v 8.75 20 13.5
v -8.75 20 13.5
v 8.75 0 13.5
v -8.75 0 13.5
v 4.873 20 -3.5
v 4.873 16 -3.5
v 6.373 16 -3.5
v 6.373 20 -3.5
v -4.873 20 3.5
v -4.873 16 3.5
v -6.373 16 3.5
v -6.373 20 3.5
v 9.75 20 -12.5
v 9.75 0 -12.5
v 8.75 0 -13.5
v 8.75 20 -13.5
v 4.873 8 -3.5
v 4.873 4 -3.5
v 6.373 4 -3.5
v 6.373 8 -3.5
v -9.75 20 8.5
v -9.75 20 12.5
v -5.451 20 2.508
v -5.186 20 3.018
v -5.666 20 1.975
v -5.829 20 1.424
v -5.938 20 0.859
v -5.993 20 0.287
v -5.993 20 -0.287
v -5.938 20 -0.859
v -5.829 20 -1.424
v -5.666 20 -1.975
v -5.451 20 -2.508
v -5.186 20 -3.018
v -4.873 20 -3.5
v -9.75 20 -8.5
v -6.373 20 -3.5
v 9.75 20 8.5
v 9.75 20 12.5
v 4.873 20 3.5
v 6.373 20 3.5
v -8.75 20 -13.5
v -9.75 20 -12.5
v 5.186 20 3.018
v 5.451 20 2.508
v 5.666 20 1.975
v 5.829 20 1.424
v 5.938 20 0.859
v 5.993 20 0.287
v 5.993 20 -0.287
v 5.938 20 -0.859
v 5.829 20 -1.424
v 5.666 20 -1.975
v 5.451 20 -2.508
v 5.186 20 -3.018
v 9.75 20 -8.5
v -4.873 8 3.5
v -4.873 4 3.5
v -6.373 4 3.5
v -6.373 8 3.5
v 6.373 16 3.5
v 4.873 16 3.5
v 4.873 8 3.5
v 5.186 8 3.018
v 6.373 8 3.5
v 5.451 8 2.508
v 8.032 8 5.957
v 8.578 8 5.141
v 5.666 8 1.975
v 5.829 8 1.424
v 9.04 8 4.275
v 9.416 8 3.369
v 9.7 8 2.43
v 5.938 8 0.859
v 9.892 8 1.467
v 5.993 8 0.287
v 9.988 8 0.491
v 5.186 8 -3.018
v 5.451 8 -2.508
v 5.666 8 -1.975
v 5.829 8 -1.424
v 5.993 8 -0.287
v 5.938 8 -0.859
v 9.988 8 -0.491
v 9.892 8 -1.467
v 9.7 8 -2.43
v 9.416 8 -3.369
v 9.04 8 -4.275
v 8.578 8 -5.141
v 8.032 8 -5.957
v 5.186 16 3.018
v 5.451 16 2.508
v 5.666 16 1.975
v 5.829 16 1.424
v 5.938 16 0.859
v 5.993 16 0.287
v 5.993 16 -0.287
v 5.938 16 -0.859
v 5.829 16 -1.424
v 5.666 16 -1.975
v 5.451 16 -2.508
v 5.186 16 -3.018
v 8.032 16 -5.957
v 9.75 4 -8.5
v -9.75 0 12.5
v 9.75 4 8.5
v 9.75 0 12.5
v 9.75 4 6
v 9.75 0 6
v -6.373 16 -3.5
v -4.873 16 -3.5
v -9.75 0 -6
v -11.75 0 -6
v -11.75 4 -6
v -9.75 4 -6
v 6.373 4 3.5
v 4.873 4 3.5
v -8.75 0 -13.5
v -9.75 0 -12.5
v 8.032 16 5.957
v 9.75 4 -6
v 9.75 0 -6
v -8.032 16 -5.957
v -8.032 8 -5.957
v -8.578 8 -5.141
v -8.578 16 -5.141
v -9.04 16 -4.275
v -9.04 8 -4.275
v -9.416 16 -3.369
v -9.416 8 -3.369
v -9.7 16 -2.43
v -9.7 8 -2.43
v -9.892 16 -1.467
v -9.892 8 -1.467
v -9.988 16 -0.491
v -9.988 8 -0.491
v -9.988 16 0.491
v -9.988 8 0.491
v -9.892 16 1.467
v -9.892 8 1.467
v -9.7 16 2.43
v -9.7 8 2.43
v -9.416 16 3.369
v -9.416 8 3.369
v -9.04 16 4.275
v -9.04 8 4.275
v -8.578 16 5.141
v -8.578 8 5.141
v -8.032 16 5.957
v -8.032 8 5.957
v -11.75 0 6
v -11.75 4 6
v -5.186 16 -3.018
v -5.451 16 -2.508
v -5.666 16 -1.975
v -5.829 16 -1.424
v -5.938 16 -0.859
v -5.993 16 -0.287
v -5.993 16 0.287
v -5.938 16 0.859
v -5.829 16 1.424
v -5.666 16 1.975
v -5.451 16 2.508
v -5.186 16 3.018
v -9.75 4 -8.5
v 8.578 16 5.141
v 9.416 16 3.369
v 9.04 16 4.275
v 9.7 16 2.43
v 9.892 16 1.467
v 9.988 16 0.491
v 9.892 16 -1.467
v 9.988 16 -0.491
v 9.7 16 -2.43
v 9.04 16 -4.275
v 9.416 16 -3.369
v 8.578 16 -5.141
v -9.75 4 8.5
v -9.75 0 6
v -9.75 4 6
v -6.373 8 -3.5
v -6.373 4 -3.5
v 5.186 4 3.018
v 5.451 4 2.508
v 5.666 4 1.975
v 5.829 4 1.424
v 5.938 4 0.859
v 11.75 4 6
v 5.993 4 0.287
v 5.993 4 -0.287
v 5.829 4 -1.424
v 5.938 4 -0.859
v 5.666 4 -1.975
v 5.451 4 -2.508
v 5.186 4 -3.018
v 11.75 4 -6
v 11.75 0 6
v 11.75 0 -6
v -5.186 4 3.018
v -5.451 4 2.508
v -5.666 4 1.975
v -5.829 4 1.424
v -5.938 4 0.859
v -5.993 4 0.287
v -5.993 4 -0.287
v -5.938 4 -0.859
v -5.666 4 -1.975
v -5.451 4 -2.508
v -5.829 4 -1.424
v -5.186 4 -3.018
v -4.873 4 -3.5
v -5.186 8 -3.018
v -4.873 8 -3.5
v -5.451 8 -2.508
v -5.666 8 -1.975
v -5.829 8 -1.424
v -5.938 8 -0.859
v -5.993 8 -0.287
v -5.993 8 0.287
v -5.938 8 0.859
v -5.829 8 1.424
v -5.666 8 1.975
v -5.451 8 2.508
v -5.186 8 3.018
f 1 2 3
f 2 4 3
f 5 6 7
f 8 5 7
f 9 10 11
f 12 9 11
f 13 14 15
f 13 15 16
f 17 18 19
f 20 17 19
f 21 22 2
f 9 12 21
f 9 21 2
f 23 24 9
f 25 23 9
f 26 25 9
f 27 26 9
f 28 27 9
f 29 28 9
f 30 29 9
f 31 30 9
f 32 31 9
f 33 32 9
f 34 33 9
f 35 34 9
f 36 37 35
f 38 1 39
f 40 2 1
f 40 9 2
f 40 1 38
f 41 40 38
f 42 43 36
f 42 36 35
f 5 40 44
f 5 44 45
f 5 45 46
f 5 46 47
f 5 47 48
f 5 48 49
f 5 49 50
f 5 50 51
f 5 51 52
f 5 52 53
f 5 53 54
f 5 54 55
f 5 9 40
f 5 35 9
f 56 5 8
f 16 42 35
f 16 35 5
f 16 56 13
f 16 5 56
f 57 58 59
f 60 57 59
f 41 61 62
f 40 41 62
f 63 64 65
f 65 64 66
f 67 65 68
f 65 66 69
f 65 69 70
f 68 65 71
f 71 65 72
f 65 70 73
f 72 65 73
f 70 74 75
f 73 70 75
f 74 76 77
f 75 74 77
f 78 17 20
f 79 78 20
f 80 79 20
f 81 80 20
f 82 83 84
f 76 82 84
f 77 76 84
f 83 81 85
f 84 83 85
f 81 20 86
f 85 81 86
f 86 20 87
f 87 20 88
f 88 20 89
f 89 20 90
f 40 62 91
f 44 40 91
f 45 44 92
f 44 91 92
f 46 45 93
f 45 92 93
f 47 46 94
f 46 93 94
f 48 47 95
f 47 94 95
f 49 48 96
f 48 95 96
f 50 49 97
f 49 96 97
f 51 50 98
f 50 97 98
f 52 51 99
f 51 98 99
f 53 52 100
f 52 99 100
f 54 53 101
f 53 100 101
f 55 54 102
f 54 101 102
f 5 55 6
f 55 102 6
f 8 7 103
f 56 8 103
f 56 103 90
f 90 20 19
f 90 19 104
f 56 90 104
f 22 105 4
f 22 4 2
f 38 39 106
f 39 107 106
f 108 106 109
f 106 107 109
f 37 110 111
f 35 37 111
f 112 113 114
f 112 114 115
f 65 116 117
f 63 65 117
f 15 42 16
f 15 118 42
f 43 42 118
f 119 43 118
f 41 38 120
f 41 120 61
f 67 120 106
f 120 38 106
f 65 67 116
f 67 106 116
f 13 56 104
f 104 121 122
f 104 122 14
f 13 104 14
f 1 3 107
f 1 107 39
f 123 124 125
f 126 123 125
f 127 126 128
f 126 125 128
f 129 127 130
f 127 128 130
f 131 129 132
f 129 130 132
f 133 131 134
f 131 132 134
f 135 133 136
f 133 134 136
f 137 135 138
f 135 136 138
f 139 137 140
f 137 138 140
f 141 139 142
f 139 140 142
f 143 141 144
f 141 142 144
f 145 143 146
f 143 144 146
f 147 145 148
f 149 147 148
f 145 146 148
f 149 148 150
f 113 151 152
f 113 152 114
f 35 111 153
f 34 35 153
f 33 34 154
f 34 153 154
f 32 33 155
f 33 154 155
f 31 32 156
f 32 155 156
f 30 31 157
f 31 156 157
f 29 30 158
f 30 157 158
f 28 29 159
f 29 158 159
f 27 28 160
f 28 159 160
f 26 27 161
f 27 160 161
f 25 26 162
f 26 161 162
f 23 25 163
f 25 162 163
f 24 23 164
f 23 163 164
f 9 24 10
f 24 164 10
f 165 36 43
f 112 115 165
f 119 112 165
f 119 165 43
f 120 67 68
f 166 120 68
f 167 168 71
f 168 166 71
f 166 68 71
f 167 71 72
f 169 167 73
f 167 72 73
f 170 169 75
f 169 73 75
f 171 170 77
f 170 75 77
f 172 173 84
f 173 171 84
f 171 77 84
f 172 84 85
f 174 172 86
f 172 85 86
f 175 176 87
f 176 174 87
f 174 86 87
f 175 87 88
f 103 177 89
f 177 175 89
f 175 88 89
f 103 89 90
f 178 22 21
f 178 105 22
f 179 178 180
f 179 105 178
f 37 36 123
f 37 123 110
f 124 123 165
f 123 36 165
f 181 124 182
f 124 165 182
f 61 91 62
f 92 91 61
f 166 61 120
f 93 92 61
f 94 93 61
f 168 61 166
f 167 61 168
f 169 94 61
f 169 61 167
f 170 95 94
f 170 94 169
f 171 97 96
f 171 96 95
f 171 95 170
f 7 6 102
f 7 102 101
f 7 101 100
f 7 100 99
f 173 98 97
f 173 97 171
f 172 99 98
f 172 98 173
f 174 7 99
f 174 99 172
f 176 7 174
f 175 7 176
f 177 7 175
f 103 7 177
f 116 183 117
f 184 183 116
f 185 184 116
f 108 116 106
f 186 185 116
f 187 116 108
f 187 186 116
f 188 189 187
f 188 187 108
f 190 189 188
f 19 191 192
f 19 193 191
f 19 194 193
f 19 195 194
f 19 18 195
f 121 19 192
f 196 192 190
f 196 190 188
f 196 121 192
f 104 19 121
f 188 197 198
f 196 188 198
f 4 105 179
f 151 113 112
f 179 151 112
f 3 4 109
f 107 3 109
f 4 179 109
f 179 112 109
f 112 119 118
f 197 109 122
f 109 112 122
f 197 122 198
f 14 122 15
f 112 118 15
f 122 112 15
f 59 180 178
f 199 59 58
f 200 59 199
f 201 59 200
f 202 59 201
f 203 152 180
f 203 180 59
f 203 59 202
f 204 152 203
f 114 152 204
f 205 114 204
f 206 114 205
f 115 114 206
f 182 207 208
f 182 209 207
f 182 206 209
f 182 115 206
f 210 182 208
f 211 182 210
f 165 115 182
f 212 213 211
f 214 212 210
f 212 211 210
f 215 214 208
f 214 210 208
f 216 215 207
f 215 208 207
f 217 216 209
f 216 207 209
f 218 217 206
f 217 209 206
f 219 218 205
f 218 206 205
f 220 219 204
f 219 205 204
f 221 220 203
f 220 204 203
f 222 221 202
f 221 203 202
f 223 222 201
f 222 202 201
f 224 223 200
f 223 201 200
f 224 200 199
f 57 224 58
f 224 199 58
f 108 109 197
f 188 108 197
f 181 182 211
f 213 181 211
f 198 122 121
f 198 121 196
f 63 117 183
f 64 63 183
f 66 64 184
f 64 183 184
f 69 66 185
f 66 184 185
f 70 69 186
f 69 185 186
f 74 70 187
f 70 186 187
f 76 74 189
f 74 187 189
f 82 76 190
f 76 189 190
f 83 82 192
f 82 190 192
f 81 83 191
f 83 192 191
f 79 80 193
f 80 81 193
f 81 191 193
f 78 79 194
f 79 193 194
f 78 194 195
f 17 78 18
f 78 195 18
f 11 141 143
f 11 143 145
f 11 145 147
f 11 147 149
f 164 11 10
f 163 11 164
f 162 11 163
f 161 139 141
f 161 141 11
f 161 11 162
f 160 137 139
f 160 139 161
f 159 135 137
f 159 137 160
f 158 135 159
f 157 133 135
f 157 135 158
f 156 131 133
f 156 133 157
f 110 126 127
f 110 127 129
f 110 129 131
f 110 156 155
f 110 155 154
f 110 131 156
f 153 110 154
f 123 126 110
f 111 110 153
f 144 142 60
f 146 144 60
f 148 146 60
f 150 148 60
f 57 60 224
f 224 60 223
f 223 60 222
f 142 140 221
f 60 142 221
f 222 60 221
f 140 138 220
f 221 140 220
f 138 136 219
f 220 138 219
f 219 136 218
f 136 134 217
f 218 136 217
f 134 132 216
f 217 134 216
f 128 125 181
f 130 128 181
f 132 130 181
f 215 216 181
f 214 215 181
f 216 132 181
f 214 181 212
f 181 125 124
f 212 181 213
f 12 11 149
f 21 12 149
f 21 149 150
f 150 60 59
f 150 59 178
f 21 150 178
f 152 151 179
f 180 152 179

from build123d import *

# Parameters (mm, degrees)
SKETCH1_W           = 2
SKETCH1_H           = 12
SKETCH1_W_2         = 19.5
SKETCH1_H_2         = 27
BOSS_EXTRUDE1_DEPTH = 4
SKETCH2_W           = 19.5
SKETCH2_H           = 5
SKETCH2_R           = 6
BOSS_EXTRUDE2_DEPTH = 16
BOSS_EXTRUDE3_START = 4
SKETCH3_R           = 10
BOSS_EXTRUDE3_DEPTH = 8
CHAMFER1_SIZE       = 1


with BuildPart() as part:
    # Sketch1 → Boss-Extrude1 (new body)
    with BuildSketch(Plane(origin=(0, 0, 0), x_dir=(1, 0, 0), z_dir=(0, 1, 0))):
        with Locations((-10.75, 0)):
            Rectangle(SKETCH1_W, SKETCH1_H)
        Rectangle(SKETCH1_W_2, SKETCH1_H_2)
        with Locations((10.75, 0)):
            Rectangle(SKETCH1_W, SKETCH1_H)
    extrude(amount=BOSS_EXTRUDE1_DEPTH)

    # Sketch2 → Boss-Extrude2 (add)
    with BuildSketch(Plane(origin=(0, 4, 0), x_dir=(1, 0, 0), z_dir=(0, 1, 0))):
        with BuildLine():
            Line((-6.373397172, 3.5), (-4.873397172, 3.5))
            ThreePointArc((-4.873397172, 3.5), (0, 6), (4.873397172, 3.5))
            Line((4.873397172, 3.5), (6.373397172, 3.5))
            Line((6.373397172, 3.5), (9.75, 8.5))
            Line((9.75, 8.5), (-9.75, 8.5))
            Line((-9.75, 8.5), (-6.373397172, 3.5))
        make_face()
        with Locations((0, 11)):
            Rectangle(SKETCH2_W, SKETCH2_H)
        Circle(SKETCH2_R)
        with BuildLine():
            Line((-6.373397172, -3.5), (-9.75, -8.5))
            Line((-9.75, -8.5), (9.75, -8.5))
            Line((9.75, -8.5), (6.373397172, -3.5))
            Line((6.373397172, -3.5), (4.873397172, -3.5))
            ThreePointArc((4.873397172, -3.5), (0, -6), (-4.873397172, -3.5))
            Line((-4.873397172, -3.5), (-6.373397172, -3.5))
        make_face()
        with Locations((0, -11)):
            Rectangle(SKETCH2_W, SKETCH2_H)
    extrude(amount=BOSS_EXTRUDE2_DEPTH)

    # Sketch3 → Boss-Extrude3 (add)
    with BuildSketch(Plane(origin=(0, 4, 0), x_dir=(1, 0, 0), z_dir=(0, 1, 0)).offset(BOSS_EXTRUDE3_START)):
        Circle(SKETCH3_R)
    extrude(amount=BOSS_EXTRUDE3_DEPTH)

    # Chamfer1
    chamfer1_edges = [part.edges().sort_by_distance(p)[0] for p in [
        (-9.75, 10, -13.5),
        (9.75, 10, -13.5),
        (9.75, 10, 13.5),
        (-9.75, 10, 13.5),
    ]]
    chamfer(chamfer1_edges, length=CHAMFER1_SIZE)


solid = part.part
